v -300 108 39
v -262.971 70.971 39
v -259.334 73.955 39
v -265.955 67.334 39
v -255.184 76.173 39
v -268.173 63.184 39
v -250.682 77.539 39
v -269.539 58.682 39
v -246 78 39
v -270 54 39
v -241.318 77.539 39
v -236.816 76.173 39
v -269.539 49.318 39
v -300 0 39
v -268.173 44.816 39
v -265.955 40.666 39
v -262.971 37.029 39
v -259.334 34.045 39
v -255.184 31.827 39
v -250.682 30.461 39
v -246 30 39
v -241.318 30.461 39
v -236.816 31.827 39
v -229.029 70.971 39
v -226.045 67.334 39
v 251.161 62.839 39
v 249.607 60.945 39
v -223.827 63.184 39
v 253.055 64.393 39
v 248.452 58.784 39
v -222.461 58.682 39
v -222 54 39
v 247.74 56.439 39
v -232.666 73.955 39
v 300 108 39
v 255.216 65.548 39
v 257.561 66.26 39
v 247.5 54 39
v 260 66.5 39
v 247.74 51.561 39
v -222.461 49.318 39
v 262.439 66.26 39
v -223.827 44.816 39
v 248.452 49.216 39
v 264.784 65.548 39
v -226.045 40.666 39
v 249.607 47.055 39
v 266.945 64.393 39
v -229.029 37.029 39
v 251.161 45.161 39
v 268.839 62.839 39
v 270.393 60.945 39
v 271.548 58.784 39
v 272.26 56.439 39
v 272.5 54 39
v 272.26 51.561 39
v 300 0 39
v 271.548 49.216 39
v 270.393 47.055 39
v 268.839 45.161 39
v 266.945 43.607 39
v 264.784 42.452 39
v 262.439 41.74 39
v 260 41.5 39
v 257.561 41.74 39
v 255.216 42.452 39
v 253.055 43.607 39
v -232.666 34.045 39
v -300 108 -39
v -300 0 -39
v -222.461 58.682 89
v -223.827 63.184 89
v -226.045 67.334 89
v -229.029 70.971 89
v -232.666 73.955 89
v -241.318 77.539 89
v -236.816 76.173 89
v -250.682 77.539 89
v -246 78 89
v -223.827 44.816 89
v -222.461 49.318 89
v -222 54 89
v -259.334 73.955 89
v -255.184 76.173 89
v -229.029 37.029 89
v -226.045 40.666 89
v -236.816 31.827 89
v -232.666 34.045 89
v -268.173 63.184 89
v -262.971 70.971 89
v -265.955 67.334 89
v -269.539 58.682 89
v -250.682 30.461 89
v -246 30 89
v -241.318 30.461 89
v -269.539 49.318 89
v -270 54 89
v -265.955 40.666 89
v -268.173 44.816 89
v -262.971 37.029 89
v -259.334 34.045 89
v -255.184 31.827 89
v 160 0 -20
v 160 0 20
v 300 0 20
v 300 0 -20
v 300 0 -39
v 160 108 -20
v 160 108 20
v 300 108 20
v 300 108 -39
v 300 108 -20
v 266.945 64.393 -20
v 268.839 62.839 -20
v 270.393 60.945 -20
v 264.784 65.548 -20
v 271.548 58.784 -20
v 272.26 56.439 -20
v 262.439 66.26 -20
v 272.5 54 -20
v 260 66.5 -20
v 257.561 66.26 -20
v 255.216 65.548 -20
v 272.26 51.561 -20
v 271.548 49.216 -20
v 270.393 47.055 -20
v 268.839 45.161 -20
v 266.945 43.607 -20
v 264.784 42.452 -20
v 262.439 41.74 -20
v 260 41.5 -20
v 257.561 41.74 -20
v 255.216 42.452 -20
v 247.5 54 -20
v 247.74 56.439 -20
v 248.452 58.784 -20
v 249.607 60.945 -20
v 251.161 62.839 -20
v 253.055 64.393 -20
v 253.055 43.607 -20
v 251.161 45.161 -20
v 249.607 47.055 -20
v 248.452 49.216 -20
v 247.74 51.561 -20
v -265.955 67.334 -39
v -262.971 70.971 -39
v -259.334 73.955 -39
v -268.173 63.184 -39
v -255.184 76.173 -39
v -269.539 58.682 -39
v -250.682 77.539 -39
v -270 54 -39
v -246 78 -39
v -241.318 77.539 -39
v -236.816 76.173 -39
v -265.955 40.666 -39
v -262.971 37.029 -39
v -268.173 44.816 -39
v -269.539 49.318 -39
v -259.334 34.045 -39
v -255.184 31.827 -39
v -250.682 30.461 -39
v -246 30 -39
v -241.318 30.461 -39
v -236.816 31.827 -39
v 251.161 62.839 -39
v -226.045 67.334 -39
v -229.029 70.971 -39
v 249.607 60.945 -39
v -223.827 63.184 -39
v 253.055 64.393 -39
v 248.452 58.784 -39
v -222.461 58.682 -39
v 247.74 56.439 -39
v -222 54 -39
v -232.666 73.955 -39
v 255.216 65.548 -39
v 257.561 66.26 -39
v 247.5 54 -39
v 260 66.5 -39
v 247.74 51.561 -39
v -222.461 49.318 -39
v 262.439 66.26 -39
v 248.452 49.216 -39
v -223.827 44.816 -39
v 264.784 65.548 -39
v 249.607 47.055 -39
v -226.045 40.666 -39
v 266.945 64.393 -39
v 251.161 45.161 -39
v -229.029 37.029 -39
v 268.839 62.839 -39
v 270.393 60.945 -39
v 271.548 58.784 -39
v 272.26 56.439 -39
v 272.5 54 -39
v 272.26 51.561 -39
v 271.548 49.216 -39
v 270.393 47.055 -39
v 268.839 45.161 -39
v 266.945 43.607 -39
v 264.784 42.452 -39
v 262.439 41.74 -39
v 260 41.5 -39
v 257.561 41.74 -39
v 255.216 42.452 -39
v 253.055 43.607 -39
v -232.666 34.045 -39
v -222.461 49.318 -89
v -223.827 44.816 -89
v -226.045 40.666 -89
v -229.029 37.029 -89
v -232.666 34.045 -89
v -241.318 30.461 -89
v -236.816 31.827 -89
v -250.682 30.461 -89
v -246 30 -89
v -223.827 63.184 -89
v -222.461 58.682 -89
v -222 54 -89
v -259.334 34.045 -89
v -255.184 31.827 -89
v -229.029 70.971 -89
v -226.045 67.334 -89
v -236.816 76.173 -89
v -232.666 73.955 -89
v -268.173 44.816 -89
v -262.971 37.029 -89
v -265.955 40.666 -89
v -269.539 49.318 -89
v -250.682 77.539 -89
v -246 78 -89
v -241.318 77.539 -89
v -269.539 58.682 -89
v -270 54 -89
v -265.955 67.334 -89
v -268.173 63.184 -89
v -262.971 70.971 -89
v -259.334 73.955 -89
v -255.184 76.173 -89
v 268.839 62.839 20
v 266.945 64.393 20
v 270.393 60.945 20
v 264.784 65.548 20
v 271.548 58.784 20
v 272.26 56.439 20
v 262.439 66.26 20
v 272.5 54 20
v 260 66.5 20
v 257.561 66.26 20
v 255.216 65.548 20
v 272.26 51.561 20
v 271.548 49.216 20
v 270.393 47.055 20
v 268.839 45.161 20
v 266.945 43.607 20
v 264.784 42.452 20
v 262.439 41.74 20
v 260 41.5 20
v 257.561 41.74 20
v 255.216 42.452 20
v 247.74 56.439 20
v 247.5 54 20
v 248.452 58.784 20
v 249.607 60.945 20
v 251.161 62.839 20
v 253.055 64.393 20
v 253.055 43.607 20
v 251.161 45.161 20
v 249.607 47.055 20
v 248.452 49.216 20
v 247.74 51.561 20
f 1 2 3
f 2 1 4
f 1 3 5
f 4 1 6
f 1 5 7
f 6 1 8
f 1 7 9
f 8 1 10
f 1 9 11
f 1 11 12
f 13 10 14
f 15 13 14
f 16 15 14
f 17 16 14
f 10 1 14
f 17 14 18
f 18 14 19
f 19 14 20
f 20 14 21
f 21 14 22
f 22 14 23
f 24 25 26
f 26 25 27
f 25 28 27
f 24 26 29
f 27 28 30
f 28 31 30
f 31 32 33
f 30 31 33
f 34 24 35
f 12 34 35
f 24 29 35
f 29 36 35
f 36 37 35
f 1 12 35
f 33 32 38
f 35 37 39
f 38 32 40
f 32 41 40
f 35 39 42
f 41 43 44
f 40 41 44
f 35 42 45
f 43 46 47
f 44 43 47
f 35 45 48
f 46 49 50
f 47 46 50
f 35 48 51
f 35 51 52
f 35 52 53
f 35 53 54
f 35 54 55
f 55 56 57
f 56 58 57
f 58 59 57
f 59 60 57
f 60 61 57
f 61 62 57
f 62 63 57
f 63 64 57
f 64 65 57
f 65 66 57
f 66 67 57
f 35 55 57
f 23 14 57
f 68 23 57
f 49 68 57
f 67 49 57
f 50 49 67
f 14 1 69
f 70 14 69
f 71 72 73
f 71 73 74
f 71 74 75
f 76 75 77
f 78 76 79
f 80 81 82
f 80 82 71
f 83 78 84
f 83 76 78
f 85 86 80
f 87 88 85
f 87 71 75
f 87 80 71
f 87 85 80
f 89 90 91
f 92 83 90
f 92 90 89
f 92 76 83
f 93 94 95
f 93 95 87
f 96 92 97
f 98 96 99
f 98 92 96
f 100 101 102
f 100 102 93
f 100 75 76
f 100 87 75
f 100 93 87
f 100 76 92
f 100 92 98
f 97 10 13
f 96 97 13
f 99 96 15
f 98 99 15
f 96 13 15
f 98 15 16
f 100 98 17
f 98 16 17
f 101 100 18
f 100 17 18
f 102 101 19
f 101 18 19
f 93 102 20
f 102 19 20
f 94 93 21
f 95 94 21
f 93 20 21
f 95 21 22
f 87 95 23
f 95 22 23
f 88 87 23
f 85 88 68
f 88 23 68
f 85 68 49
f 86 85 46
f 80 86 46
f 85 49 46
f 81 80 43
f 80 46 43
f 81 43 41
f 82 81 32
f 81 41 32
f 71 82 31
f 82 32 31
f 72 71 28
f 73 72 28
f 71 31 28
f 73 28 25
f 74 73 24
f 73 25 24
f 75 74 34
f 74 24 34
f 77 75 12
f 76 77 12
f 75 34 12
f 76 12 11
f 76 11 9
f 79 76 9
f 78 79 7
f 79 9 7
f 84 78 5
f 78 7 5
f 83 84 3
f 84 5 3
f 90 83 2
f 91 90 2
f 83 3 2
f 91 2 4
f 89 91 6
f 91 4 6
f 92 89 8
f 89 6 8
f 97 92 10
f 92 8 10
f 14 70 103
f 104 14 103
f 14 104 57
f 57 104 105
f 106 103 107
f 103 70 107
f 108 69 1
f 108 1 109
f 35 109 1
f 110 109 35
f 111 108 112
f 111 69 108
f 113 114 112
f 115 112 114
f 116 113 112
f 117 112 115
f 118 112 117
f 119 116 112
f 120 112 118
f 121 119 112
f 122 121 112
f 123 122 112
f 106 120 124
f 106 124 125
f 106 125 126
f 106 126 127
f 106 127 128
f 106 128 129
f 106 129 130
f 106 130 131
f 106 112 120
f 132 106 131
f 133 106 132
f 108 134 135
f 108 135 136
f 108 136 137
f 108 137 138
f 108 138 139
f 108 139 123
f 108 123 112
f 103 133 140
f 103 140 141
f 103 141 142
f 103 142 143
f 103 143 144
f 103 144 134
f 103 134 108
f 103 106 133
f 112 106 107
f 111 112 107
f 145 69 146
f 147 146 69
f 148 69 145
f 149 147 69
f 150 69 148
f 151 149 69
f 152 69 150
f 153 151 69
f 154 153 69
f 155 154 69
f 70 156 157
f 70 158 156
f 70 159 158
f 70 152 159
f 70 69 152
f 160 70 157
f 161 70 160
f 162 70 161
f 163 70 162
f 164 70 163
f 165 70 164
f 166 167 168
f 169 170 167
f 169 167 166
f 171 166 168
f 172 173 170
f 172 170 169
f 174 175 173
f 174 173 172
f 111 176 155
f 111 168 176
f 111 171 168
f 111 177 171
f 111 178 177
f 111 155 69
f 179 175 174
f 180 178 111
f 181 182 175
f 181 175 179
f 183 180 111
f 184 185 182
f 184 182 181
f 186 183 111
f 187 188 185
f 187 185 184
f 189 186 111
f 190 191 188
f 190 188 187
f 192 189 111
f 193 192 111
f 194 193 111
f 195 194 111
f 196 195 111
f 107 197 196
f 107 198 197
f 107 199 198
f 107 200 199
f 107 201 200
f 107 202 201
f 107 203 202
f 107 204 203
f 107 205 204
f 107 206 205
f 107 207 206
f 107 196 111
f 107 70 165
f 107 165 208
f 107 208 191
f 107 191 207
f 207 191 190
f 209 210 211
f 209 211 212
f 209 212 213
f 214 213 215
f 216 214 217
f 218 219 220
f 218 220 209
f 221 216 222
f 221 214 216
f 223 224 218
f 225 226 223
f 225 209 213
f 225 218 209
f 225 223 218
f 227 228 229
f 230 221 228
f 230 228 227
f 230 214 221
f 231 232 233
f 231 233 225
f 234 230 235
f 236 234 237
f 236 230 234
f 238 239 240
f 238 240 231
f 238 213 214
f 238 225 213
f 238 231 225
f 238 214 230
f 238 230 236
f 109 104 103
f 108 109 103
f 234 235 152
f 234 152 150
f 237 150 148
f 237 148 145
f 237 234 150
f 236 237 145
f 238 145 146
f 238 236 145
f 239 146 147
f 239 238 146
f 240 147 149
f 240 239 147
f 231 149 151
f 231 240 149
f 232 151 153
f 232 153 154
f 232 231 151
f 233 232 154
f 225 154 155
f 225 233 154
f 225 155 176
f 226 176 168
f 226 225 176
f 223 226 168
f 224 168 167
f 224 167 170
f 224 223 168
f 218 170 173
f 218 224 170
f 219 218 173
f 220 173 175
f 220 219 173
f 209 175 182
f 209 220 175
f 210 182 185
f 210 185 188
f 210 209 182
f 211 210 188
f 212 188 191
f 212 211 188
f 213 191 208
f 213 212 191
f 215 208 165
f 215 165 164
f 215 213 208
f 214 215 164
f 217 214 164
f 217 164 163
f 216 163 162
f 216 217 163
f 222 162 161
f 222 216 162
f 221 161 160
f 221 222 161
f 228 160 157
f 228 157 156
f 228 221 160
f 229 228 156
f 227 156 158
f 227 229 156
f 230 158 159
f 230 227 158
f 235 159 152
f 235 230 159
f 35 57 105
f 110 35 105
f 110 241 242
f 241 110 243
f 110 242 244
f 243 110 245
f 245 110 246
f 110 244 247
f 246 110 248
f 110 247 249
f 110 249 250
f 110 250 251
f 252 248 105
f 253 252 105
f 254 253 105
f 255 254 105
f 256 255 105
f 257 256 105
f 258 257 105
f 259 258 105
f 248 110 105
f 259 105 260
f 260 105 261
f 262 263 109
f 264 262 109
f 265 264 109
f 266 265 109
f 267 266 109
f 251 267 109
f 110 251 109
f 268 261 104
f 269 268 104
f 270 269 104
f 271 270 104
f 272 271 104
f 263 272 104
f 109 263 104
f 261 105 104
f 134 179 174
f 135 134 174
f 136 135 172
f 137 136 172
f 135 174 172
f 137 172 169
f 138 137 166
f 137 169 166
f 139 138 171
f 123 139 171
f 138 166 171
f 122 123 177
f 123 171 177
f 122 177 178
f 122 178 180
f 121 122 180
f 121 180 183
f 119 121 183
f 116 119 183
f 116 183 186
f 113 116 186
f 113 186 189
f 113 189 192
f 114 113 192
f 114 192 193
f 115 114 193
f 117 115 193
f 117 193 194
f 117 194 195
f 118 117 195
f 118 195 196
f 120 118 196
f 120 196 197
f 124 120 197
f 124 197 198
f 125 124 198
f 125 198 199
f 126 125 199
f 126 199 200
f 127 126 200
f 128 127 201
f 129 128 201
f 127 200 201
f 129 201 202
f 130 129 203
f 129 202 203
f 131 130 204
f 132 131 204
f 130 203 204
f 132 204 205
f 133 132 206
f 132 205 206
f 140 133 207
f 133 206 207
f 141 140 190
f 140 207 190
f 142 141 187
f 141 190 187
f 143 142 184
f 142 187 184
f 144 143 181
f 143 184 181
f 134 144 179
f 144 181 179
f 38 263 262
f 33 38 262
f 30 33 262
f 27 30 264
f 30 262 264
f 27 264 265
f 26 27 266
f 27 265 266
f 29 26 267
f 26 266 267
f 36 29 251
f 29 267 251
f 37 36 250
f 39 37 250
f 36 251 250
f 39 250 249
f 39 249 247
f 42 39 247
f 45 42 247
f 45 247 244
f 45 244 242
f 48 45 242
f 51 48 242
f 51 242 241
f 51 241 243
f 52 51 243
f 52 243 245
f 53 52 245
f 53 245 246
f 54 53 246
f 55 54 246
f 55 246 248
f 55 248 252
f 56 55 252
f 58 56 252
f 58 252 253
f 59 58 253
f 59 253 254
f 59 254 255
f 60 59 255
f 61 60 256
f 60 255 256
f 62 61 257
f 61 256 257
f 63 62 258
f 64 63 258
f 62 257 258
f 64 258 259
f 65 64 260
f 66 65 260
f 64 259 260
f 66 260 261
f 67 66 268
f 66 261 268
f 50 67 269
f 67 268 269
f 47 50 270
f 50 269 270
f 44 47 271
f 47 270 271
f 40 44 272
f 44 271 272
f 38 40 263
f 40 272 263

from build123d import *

# Parameters (mm, degrees)
SKETCH1_W           = 600
SKETCH1_H           = 78
BOSS_EXTRUDE1_DEPTH = 108
SKETCH2_R           = 24
BOSS_EXTRUDE2_DEPTH = 50
BOSS_EXTRUDE3_START = 50
SKETCH3_R           = 24
BOSS_EXTRUDE3_DEPTH = 50
SKETCH4_W           = 140
SKETCH4_H           = 40
CUT_EXTRUDE1_DEPTH  = 332.036251791
SKETCH5_R           = 12.5
CUT_EXTRUDE2_DEPTH  = 344.581140344


with BuildPart() as part:
    # Sketch1 → Boss-Extrude1 (new body)
    with BuildSketch(Plane(origin=(0, 0, 0), x_dir=(1, 0, 0), z_dir=(0, 1, 0))):
        Rectangle(SKETCH1_W, SKETCH1_H)
    extrude(amount=BOSS_EXTRUDE1_DEPTH)

    # Sketch2 → Boss-Extrude2 (add)
    with BuildSketch(Plane.XY.offset(39)):
        with Locations(Location((-246, 54, 0), (0, 0, 180))):
            Circle(SKETCH2_R)
    extrude(amount=BOSS_EXTRUDE2_DEPTH)

    # Sketch3 → Boss-Extrude3 (add)
    with BuildSketch(Plane(origin=(0, 0, -39), x_dir=(-1, 0, 0), z_dir=(0, 0, -1)).offset(BOSS_EXTRUDE3_START)):
        with Locations((246, 54)):
            Circle(SKETCH3_R)
    extrude(amount=-BOSS_EXTRUDE3_DEPTH)

    # Sketch4 → Cut-Extrude1 (cut, through all)
    with BuildSketch(Plane(origin=(0, 0, 0), x_dir=(-1, 0, 0), z_dir=(0, -1, 0))):
        with Locations((-230, 0)):
            Rectangle(SKETCH4_W, SKETCH4_H)
    extrude(amount=-CUT_EXTRUDE1_DEPTH, mode=Mode.SUBTRACT)

    # Sketch5 → Cut-Extrude2 (cut, through all)
    with BuildSketch(Plane(origin=(0, 0, -39), x_dir=(-1, 0, 0), z_dir=(0, 0, -1))):
        with Locations((-260, 54)):
            Circle(SKETCH5_R)
    extrude(amount=-CUT_EXTRUDE2_DEPTH, mode=Mode.SUBTRACT)


solid = part.part
